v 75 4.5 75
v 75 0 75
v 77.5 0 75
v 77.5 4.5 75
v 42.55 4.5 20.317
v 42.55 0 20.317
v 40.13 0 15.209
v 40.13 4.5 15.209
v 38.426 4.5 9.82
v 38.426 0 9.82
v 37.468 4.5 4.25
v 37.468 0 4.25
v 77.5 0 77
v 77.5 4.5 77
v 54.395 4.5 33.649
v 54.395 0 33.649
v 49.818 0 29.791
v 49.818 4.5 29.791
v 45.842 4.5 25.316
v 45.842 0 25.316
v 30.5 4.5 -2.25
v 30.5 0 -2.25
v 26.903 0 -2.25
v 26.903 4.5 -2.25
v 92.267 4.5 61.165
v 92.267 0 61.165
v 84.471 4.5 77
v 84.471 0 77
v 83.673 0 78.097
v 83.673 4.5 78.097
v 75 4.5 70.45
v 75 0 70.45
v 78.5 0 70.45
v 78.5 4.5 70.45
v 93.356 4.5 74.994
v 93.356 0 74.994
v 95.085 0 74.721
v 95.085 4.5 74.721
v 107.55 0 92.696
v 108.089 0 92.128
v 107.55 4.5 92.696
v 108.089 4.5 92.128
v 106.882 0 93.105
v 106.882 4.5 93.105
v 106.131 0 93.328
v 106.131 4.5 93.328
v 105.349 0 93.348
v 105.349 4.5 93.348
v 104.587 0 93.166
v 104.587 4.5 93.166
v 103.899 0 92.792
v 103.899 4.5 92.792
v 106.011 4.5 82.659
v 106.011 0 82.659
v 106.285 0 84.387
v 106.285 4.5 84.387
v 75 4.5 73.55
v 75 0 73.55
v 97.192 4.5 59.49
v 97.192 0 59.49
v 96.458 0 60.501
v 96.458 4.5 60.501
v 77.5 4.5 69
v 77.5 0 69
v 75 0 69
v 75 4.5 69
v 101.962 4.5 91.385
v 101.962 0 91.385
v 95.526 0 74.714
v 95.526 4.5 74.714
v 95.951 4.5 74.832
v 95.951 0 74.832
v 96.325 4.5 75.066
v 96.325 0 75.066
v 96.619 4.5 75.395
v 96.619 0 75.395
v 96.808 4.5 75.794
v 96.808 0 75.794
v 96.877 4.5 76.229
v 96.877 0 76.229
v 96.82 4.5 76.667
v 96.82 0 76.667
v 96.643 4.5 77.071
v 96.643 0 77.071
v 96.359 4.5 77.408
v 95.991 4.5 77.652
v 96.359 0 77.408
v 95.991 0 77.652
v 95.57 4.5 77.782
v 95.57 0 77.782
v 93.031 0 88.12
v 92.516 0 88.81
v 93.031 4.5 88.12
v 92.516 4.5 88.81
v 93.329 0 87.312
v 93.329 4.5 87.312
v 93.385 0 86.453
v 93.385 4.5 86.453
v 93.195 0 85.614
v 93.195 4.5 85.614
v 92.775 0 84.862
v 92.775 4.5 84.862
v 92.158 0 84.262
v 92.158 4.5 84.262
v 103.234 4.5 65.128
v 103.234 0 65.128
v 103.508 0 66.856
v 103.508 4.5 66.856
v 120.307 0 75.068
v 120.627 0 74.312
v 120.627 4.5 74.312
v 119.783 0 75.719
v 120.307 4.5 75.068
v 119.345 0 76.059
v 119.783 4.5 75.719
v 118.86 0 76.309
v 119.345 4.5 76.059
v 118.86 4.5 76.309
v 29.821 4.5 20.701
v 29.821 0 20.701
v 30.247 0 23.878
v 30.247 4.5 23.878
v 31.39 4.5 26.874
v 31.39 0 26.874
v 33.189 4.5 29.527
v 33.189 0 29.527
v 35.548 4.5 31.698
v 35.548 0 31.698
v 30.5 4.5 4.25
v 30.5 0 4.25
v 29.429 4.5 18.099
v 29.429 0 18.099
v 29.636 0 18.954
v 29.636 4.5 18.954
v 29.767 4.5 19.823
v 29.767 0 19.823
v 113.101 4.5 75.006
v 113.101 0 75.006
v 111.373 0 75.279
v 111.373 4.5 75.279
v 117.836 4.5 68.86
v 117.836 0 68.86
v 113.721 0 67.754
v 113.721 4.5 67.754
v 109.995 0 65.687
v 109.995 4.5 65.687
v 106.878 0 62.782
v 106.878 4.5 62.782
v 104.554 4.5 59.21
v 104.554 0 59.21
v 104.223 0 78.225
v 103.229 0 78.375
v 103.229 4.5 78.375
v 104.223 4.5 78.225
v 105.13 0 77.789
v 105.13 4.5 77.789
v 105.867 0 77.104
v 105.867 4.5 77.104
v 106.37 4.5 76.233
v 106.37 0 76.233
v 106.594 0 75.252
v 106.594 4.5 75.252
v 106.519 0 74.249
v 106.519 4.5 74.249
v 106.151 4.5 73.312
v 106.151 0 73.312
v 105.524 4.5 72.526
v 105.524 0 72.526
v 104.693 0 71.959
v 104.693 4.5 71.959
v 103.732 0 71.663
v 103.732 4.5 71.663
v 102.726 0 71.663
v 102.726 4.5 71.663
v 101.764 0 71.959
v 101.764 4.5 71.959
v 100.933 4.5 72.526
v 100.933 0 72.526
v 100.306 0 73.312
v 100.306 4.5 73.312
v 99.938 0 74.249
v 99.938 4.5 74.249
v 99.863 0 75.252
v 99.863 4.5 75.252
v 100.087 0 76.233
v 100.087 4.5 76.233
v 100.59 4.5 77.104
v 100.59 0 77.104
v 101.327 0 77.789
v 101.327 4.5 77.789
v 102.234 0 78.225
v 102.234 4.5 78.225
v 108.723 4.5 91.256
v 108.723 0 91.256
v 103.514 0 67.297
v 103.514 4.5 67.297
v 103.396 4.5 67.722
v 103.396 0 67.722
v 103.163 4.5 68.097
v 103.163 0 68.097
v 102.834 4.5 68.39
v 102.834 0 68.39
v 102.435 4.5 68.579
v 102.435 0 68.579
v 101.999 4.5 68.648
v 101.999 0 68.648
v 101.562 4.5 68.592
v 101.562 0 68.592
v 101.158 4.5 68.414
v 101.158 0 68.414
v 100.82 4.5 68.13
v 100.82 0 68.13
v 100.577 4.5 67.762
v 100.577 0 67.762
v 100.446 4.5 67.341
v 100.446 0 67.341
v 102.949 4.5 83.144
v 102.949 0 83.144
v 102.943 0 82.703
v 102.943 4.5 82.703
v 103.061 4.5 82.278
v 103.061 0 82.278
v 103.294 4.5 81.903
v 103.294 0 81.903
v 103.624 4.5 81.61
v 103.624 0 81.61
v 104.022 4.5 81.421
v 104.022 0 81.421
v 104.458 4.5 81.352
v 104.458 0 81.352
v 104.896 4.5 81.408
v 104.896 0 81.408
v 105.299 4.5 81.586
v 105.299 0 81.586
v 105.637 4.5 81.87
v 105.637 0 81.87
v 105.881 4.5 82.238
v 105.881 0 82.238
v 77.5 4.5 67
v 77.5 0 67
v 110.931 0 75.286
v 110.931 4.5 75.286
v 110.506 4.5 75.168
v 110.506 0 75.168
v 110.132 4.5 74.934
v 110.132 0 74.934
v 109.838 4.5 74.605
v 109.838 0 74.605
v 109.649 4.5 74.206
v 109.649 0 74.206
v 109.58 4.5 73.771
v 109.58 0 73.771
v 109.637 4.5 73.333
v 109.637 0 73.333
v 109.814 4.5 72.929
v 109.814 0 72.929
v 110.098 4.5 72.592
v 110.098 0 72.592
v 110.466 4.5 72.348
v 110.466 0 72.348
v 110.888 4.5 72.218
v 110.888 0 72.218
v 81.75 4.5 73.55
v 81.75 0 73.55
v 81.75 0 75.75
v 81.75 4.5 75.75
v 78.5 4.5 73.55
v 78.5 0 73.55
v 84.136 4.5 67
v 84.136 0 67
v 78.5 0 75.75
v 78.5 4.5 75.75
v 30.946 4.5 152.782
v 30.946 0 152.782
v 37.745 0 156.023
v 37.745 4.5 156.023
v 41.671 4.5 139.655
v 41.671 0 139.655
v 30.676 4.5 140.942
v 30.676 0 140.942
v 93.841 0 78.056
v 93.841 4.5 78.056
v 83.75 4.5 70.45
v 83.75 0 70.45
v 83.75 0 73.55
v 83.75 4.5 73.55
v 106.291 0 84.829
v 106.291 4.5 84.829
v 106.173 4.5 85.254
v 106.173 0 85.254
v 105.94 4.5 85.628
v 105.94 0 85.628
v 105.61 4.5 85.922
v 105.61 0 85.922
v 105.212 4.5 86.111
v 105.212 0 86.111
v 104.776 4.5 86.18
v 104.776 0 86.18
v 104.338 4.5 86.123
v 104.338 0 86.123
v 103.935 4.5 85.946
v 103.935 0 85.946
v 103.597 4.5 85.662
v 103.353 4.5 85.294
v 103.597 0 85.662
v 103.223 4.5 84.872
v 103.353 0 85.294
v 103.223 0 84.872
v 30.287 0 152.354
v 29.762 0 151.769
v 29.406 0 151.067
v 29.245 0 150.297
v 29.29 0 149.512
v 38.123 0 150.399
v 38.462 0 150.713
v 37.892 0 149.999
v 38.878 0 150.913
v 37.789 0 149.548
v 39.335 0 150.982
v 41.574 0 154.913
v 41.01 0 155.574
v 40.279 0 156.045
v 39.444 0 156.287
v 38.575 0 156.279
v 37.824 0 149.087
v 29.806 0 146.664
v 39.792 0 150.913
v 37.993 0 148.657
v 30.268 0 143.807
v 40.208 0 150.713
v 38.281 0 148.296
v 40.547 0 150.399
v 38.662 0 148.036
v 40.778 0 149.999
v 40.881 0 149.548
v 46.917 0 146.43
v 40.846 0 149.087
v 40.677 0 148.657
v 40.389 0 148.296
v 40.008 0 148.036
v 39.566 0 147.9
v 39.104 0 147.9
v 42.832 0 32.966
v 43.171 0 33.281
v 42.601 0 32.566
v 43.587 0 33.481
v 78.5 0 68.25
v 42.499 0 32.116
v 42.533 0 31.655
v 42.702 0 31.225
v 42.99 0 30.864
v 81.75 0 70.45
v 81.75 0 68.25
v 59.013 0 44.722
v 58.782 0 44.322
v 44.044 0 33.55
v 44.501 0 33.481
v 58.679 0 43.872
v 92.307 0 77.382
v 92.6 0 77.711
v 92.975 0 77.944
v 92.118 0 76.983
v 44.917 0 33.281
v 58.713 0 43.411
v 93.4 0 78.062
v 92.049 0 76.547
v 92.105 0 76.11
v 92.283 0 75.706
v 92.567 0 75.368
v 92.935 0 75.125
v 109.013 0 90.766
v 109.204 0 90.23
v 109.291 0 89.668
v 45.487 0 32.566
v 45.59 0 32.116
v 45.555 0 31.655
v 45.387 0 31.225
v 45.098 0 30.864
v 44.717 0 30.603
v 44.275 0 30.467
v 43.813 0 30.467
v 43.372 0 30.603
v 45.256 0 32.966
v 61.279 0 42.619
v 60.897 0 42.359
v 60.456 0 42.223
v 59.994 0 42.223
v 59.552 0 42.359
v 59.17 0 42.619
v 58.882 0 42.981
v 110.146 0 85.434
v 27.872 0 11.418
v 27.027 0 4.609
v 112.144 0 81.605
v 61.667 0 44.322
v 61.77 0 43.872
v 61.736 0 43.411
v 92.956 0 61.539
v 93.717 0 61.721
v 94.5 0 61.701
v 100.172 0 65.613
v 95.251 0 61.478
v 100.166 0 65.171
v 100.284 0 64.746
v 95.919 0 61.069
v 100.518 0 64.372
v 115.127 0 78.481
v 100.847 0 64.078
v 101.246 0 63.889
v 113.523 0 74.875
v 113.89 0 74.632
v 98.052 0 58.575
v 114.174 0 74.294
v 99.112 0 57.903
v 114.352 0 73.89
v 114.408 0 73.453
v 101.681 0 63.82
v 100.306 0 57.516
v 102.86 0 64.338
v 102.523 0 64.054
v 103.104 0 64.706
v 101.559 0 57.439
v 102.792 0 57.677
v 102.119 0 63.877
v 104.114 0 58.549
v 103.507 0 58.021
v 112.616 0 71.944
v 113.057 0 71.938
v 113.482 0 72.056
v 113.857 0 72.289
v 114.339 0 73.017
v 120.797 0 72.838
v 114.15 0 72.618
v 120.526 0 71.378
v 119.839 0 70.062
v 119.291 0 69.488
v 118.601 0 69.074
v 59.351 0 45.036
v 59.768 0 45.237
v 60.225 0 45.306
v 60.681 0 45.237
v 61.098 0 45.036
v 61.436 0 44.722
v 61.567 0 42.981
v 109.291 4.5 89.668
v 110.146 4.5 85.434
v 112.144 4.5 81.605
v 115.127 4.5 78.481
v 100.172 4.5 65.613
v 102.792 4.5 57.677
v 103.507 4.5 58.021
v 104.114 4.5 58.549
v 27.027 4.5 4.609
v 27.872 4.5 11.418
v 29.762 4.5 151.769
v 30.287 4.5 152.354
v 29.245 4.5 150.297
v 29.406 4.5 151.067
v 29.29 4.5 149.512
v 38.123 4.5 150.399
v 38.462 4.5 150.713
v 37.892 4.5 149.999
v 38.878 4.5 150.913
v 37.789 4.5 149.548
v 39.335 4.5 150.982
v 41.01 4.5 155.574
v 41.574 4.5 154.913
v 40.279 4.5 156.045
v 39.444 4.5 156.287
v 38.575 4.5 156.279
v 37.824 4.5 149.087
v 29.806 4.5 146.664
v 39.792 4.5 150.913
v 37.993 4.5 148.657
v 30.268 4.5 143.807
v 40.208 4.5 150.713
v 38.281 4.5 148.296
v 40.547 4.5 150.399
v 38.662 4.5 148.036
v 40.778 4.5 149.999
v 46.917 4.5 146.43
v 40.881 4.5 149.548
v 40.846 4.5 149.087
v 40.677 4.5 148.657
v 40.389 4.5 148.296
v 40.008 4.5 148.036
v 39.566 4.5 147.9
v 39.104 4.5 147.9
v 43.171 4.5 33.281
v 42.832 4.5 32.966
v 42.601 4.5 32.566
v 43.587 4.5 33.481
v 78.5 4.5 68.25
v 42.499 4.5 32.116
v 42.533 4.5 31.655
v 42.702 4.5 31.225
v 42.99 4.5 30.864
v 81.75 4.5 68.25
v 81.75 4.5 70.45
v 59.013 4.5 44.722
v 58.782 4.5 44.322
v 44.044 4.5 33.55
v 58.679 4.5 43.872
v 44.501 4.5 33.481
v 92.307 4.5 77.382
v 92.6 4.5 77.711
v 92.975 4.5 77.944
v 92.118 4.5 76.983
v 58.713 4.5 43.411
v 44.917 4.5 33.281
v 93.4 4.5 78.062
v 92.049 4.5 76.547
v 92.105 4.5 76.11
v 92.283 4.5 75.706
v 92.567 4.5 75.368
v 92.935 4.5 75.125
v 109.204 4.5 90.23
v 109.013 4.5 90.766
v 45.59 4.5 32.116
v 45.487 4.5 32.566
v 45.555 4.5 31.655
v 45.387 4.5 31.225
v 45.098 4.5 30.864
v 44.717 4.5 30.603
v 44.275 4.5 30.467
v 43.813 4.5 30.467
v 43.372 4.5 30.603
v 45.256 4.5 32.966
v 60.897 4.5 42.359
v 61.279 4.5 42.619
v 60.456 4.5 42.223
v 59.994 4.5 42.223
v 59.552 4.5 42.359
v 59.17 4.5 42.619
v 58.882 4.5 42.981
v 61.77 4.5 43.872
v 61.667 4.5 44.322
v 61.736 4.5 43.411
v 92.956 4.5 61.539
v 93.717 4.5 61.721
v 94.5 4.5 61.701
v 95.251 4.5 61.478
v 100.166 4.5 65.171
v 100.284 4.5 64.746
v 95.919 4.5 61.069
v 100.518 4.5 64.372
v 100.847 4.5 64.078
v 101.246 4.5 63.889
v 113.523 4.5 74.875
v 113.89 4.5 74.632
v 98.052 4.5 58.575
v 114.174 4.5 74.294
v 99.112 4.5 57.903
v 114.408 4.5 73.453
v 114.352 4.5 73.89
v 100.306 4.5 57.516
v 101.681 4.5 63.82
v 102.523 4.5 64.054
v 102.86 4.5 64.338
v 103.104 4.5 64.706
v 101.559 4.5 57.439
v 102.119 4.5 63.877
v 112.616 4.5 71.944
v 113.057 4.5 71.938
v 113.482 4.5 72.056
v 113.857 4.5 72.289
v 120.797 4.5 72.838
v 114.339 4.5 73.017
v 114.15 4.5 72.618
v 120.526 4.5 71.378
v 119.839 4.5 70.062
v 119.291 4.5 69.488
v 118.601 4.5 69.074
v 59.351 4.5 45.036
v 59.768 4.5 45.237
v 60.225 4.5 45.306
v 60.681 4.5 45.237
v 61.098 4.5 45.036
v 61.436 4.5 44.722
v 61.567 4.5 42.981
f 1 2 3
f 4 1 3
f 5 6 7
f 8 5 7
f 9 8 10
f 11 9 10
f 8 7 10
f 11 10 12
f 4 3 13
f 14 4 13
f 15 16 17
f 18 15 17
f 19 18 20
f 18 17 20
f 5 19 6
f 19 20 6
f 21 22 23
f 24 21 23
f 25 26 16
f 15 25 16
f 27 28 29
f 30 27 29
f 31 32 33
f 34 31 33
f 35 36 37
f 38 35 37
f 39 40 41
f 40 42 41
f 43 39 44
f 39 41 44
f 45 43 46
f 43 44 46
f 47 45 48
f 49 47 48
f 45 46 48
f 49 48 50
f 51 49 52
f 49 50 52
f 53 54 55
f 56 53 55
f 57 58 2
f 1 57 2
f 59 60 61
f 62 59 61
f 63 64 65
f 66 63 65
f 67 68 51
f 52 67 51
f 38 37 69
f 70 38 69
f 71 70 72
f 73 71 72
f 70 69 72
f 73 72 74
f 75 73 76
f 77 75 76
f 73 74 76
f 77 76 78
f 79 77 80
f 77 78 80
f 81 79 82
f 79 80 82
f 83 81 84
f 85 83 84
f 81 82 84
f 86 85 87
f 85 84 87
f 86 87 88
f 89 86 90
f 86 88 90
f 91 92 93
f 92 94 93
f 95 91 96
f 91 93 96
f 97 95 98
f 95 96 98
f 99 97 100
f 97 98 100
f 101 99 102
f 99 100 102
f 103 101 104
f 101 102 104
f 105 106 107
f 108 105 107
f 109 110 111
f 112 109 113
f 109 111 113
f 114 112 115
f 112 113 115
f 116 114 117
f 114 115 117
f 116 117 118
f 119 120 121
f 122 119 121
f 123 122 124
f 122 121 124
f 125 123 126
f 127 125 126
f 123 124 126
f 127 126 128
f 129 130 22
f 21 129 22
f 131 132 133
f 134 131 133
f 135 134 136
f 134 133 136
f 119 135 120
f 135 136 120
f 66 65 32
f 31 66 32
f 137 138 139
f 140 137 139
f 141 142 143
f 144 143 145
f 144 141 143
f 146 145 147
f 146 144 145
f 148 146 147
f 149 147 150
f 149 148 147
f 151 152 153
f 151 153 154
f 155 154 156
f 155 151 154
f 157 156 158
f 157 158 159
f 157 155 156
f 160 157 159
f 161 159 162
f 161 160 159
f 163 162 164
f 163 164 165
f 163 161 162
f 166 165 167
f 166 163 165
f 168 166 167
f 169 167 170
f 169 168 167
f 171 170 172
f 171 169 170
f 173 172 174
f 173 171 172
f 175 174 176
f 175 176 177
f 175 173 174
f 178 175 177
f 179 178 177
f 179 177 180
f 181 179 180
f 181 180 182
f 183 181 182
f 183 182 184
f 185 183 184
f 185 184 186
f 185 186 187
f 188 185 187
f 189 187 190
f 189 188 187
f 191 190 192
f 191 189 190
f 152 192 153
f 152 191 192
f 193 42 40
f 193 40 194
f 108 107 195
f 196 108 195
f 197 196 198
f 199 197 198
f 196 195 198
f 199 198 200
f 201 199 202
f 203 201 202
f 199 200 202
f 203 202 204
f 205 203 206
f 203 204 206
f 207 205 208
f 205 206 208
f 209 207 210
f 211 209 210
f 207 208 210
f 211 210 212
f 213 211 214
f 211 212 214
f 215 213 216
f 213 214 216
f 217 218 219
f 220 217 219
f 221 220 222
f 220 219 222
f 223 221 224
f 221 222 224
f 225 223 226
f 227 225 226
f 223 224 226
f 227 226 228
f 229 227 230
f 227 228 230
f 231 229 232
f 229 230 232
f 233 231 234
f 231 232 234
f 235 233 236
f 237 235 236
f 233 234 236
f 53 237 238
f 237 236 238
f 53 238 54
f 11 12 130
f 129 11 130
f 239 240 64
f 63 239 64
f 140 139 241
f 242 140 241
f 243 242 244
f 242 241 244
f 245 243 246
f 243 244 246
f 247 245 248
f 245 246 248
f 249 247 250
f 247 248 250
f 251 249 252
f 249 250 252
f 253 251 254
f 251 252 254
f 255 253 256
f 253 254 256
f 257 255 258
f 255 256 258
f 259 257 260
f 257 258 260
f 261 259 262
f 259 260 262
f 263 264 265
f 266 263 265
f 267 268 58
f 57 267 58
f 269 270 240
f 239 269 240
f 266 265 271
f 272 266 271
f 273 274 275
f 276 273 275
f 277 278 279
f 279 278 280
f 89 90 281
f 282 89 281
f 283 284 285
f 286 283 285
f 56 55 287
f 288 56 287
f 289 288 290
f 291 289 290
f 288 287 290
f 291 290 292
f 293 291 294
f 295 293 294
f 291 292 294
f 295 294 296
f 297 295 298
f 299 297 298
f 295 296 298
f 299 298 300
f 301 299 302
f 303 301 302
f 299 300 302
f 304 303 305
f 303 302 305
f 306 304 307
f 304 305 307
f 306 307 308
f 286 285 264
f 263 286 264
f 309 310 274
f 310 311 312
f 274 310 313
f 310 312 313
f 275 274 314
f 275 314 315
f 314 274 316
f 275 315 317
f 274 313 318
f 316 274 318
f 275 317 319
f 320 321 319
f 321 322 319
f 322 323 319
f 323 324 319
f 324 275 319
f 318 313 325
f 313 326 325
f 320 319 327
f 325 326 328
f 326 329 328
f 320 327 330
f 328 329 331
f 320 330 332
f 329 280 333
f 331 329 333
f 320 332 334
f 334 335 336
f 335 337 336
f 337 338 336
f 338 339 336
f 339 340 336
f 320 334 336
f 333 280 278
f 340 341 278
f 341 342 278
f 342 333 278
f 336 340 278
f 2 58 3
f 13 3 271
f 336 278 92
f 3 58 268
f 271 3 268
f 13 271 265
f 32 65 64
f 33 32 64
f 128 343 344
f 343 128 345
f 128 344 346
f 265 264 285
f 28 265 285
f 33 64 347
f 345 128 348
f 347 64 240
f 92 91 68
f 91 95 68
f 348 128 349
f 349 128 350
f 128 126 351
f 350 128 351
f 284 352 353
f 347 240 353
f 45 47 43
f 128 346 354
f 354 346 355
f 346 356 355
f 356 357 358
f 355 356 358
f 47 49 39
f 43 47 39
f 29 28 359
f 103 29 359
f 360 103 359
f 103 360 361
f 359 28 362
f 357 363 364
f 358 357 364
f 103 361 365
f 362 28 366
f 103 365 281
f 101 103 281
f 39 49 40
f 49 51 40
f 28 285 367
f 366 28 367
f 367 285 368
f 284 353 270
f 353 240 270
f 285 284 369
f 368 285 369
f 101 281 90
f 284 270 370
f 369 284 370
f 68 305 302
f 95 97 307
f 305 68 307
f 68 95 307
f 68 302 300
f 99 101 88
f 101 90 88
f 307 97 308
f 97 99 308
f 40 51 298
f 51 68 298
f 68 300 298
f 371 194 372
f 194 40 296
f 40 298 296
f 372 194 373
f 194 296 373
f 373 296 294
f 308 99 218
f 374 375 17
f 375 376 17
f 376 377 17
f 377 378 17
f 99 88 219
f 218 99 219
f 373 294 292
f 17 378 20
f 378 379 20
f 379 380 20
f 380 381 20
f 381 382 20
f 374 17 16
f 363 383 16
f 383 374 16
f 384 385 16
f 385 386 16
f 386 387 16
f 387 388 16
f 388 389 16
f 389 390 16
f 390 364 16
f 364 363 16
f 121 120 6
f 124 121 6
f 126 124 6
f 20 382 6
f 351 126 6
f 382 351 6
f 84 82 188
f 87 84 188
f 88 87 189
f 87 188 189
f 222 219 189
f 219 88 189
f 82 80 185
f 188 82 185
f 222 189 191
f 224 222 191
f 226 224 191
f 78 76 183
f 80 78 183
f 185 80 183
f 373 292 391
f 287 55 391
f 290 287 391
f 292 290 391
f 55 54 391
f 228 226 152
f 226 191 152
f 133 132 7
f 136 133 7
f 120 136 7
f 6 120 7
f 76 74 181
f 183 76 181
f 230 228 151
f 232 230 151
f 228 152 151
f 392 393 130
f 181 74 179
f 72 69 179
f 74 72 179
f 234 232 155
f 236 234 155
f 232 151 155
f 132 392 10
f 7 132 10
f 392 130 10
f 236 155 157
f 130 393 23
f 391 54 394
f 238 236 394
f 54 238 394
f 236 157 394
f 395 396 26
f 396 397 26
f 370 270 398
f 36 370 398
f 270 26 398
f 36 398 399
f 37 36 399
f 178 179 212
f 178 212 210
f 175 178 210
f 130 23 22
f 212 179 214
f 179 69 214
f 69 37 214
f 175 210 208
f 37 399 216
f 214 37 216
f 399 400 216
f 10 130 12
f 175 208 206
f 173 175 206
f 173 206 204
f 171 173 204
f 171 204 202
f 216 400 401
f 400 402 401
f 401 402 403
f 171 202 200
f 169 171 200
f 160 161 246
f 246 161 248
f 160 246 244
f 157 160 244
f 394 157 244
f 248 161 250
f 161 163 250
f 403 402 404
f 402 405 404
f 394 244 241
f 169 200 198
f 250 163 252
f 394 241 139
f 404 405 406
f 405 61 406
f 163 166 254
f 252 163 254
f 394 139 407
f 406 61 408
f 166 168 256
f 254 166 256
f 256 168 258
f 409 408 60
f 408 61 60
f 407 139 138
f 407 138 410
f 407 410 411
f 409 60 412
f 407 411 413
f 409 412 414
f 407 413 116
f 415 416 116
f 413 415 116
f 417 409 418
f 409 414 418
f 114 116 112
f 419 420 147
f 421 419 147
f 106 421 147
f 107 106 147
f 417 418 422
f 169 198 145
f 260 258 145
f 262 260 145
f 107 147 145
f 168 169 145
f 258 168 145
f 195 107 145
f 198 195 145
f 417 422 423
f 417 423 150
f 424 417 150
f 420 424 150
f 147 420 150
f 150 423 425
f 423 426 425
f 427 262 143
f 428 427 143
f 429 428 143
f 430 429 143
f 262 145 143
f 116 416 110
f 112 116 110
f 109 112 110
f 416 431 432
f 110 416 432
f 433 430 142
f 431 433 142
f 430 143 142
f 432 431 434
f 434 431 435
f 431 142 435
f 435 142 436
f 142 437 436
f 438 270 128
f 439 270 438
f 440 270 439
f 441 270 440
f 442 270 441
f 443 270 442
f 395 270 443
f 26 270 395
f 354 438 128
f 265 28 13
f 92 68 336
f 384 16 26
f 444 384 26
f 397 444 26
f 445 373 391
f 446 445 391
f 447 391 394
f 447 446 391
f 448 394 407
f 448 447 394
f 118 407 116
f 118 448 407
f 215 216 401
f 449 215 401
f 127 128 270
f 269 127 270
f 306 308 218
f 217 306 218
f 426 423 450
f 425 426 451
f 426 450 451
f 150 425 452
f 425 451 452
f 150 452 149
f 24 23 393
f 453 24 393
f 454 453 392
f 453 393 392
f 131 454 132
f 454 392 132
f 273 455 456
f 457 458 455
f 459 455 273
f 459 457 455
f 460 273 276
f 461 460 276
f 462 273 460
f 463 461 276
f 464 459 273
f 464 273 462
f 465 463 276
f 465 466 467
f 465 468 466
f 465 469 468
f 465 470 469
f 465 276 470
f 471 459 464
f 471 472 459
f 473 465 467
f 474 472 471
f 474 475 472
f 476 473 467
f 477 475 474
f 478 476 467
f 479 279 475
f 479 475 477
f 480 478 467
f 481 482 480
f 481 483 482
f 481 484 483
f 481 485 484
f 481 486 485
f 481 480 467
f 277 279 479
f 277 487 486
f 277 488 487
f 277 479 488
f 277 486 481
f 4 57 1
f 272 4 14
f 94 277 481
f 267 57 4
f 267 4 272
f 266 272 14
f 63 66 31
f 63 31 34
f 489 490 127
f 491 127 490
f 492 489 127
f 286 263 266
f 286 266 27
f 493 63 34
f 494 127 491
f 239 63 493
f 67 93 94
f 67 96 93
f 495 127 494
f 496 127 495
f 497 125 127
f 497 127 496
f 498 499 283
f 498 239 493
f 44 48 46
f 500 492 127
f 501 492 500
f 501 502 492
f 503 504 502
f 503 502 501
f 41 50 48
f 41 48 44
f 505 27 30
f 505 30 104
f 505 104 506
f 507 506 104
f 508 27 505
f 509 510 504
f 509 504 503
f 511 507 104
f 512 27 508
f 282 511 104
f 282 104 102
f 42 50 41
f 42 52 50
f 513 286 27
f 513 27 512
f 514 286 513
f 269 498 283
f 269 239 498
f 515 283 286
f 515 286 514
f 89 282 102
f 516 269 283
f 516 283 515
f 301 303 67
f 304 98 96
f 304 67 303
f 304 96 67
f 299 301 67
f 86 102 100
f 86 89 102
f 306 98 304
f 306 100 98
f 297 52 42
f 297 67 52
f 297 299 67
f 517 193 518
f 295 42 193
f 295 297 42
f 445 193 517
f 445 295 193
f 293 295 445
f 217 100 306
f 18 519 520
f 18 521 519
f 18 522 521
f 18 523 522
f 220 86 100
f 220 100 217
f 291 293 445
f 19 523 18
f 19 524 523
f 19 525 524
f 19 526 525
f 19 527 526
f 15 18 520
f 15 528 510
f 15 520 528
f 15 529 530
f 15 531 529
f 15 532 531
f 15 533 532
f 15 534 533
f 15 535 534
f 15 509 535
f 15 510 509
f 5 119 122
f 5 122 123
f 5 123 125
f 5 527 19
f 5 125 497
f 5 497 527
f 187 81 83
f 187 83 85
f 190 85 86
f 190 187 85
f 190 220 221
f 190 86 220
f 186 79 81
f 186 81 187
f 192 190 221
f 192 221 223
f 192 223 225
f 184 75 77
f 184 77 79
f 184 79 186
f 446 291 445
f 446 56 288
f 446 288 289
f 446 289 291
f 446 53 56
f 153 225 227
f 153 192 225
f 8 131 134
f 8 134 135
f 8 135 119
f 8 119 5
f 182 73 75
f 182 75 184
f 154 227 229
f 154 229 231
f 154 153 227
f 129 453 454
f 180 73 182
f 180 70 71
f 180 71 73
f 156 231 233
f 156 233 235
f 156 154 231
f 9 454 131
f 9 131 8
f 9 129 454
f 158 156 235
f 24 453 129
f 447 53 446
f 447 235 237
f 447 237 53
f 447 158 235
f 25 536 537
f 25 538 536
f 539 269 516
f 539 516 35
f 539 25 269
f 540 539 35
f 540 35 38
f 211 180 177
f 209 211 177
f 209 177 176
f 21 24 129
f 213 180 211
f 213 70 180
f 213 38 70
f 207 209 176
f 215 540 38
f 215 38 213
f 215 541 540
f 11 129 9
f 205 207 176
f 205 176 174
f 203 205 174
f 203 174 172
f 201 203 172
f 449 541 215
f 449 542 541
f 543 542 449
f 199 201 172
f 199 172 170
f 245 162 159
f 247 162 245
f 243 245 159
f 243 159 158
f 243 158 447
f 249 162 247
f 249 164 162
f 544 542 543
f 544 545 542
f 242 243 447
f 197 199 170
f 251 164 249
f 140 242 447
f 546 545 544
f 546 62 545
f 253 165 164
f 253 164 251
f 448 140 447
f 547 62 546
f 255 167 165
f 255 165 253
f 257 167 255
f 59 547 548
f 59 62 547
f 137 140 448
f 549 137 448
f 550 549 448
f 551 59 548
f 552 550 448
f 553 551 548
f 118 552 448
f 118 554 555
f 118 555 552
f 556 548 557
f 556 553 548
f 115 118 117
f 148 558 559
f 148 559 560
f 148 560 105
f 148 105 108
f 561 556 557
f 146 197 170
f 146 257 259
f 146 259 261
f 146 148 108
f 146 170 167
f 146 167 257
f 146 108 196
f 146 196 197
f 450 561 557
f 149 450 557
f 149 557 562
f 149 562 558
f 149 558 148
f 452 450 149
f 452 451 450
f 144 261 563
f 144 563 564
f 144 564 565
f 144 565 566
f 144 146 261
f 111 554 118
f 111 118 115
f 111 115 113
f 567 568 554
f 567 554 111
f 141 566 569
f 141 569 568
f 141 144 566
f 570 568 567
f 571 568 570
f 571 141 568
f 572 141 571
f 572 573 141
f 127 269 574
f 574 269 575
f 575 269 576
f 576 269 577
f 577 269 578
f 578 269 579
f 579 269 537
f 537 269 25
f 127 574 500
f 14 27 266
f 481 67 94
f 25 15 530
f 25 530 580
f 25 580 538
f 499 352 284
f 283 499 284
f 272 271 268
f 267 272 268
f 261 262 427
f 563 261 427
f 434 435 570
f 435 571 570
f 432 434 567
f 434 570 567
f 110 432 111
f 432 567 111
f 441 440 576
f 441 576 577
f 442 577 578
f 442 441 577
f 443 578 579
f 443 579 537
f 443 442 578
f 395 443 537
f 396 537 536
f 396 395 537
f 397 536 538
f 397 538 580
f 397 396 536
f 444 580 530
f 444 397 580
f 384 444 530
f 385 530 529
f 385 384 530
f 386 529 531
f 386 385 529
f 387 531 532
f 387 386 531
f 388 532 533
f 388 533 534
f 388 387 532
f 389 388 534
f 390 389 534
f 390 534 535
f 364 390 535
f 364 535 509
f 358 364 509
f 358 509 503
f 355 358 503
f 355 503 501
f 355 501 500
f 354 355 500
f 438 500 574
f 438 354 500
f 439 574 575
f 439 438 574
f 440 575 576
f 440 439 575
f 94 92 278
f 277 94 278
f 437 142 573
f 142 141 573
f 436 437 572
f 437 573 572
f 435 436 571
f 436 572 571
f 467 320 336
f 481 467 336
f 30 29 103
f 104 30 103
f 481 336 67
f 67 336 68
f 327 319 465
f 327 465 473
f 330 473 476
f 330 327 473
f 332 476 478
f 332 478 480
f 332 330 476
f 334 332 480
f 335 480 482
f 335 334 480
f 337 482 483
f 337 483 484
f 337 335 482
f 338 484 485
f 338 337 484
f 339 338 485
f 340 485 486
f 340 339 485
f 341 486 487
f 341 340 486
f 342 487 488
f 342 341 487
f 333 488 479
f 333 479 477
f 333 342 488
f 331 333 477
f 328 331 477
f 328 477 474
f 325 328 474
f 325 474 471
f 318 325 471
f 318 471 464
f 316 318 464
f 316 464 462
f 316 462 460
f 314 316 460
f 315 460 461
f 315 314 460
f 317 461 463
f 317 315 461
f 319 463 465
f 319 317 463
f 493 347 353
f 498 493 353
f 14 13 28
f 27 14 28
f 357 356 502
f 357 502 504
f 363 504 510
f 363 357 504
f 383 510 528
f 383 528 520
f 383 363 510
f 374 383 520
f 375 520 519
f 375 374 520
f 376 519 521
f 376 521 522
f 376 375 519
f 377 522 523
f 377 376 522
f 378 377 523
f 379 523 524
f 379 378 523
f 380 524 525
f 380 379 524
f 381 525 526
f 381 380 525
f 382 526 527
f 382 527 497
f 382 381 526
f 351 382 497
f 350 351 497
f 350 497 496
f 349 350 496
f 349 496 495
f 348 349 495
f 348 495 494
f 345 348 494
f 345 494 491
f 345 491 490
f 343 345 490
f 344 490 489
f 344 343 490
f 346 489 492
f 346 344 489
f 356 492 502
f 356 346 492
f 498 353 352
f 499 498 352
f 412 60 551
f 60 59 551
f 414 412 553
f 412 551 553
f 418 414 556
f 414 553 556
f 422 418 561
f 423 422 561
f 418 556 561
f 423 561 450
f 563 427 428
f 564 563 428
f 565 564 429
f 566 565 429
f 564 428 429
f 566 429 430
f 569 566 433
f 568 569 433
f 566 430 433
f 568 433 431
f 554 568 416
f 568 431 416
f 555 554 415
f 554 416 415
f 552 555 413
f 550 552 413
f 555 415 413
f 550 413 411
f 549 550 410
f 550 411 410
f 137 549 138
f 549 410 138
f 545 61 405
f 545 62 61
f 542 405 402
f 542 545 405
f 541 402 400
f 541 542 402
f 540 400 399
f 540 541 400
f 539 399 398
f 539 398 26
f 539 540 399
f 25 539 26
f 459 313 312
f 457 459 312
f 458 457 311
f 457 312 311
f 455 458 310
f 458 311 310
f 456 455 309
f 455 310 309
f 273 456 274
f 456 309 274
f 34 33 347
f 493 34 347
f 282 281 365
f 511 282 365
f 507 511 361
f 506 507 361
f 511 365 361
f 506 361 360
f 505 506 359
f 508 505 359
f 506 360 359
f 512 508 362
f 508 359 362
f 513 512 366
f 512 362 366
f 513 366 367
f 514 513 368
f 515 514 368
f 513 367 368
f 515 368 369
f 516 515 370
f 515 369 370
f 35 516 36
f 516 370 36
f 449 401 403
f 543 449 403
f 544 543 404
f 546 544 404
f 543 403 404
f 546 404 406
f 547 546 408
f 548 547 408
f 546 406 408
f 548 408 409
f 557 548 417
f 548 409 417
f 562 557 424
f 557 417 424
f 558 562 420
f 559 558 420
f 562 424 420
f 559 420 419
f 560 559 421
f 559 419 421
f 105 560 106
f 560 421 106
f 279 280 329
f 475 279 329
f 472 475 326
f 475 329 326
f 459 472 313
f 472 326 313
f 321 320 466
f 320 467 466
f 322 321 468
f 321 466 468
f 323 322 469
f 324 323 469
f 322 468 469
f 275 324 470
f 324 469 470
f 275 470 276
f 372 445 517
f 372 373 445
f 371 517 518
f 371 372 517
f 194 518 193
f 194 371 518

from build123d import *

# Parameters (mm, degrees)
SKETCH_3_R          = 1.55
SKETCH_3_R_2        = 3.375
EXTRUDE_1_DEPTH     = 4.5
FILLET_1_R          = 5
CUT_EXTRUDE_2_REACH = 200.281
FILLET_3_R          = 3
EXTRUDE_5096_DEPTH  = 4.5


with BuildPart() as part:
    # 草图3 → 凸台-拉伸1 (new body)
    with BuildSketch(Plane(origin=(0, 0, 0), x_dir=(1, 0, 0), z_dir=(0, 1, 0))):
        with BuildLine():
            Line((94.694386062, -62.928175745), (41.131907973, -24.012757507))
            ThreePointArc((41.131907973, -24.012757507), (34.497097301, -25.063608282), (35.547948076, -31.698418954))
            Line((35.547948076, -31.698418954), (84.136405992, -67))
            Line((84.136405992, -67), (77.5, -67))
            Line((77.5, -67), (77.5, -69))
            Line((77.5, -69), (75, -69))
            Line((75, -69), (75, -70.45))
            Line((75, -70.45), (78.5, -70.45))
            Line((78.5, -70.45), (78.5, -68.25))
            Line((78.5, -68.25), (81.75, -68.25))
            Line((81.75, -68.25), (81.75, -70.45))
            Line((81.75, -70.45), (83.75, -70.45))
            Line((83.75, -70.45), (83.75, -73.55))
            Line((83.75, -73.55), (81.75, -73.55))
            Line((81.75, -73.55), (81.75, -75.75))
            Line((81.75, -75.75), (78.5, -75.75))
            Line((78.5, -75.75), (78.5, -73.55))
            Line((78.5, -73.55), (75, -73.55))
            Line((75, -73.55), (75, -75))
            Line((75, -75), (77.5, -75))
            Line((77.5, -75), (77.5, -77))
            Line((77.5, -77), (84.136405992, -77))
            Line((84.136405992, -77), (84.470607294, -77))
            Line((84.470607294, -77), (83.673412582, -78.097244389))
            Line((83.673412582, -78.097244389), (94.999650503, -86.326237921))
            Line((94.999650503, -86.326237921), (41.671203749, -139.654684675))
            Line((41.671203749, -139.654684675), (30.676078989, -140.941956792))
            ThreePointArc((30.676078989, -140.941956792), (30.043220441, -145.236869059), (29.290205532, -149.512351472))
            ThreePointArc((29.290205532, -149.512351472), (29.56084749, -151.429597804), (30.946340523, -152.782184076))
            Line((30.946340523, -152.782184076), (40.152805518, -157.170406668))
            Line((40.152805518, -157.170406668), (46.916516286, -146.430187419))
            Line((46.916516286, -146.430187419), (101.962013194, -91.384690511))
            Line((101.962013194, -91.384690511), (106.325888424, -94.555231453))
            Line((106.325888424, -94.555231453), (122.783875489, -71.902755611))
            Line((122.783875489, -71.902755611), (100.131399646, -55.444768547))
            Line((100.131399646, -55.444768547), (94.694386062, -62.928175745))
        make_face()
        with Locations(Location((39.335, -149.432300402, 0), (0, 0, 270))):
            Circle(SKETCH_3_R, mode=Mode.SUBTRACT)
        with Locations(Location((44.044221455, -32, 0), (0, 0, 270))):
            Circle(SKETCH_3_R, mode=Mode.SUBTRACT)
        with Locations(Location((60.224561343, -43.755705046, 0), (0, 0, 270))):
            Circle(SKETCH_3_R, mode=Mode.SUBTRACT)
        with BuildLine():
            ThreePointArc((95.08466389, -74.720558792), (96.858054238, -76.0090023), (95.569610731, -77.782392648))
            Line((95.569610731, -77.782392648), (93.841156135, -78.056152962))
            ThreePointArc((93.841156135, -78.056152962), (92.067765787, -76.767709455), (93.356209294, -74.994319106))
            Line((93.356209294, -74.994319106), (95.08466389, -74.720558792))
        make_face(mode=Mode.SUBTRACT)
        with BuildLine():
            Line((103.222963142, -84.872434742), (102.949202828, -83.143980146))
            ThreePointArc((102.949202828, -83.143980146), (104.237646335, -81.370589797), (106.011036684, -82.659033304))
            Line((106.011036684, -82.659033304), (106.284796997, -84.3874879))
            ThreePointArc((106.284796997, -84.3874879), (104.99635349, -86.160878249), (103.222963142, -84.872434742))
        make_face(mode=Mode.SUBTRACT)
        with Locations(Location((103.228644035, -75, 0), (0, 0, 270))):
            Circle(SKETCH_3_R_2, mode=Mode.SUBTRACT)
        with BuildLine():
            ThreePointArc((111.372624181, -75.279441208), (109.599233832, -73.9909977), (110.887677339, -72.217607352))
            Line((110.887677339, -72.217607352), (112.616131935, -71.943847038))
            ThreePointArc((112.616131935, -71.943847038), (114.389522284, -73.232290545), (113.101078777, -75.005680894))
            Line((113.101078777, -75.005680894), (111.372624181, -75.279441208))
        make_face(mode=Mode.SUBTRACT)
        with BuildLine():
            Line((103.234324929, -65.127565258), (103.508085243, -66.856019854))
            ThreePointArc((103.508085243, -66.856019854), (102.219641736, -68.629410203), (100.446251387, -67.340966696))
            Line((100.446251387, -67.340966696), (100.172491073, -65.6125121))
            ThreePointArc((100.172491073, -65.6125121), (101.46093458, -63.839121751), (103.234324929, -65.127565258))
        make_face(mode=Mode.SUBTRACT)
    extrude(amount=EXTRUDE_1_DEPTH)

    # 圆角-美观1
    fillet_1_edges = [part.edges().sort_by_distance(p)[0] for p in [
        (100.131399646, 2.25, 55.444768547),
        (122.783875489, 2.25, 71.902755611),
    ]]
    fillet(fillet_1_edges, radius=FILLET_1_R)

    # 草图4 → 圆弧-美观2 (cut, up to next)
    with BuildSketch(Plane(origin=(0, 4.5, 0), x_dir=(1, 0, 0), z_dir=(0, 1, 0)), mode=Mode.PRIVATE) as cut_extrude_2_sk1:
        with BuildLine():
            ThreePointArc((118.738790517, -68.963829349), (109.994899962, -65.687047674), (104.176484618, -58.383694808))
            Line((104.176484618, -58.383694808), (118.738790517, -68.963829349))
        make_face()
    cut_extrude_2_tool1 = extrude(cut_extrude_2_sk1.sketch, amount=-CUT_EXTRUDE_2_REACH, mode=Mode.PRIVATE) & part.part
    # 草图4 → 圆弧-美观2 (cut, up to next)
    with BuildSketch(Plane(origin=(0, 4.5, 0), x_dir=(1, 0, 0), z_dir=(0, 1, 0)), mode=Mode.PRIVATE) as cut_extrude_2_sk2:
        with BuildLine():
            Line((119.844949227, -75.947840583), (109.264814686, -90.510146481))
            ThreePointArc((109.264814686, -90.510146481), (112.204348353, -81.521230905), (119.844949227, -75.947840583))
        make_face()
    cut_extrude_2_tool2 = extrude(cut_extrude_2_sk2.sketch, amount=-CUT_EXTRUDE_2_REACH, mode=Mode.PRIVATE) & part.part
    add(cut_extrude_2_tool1.solids().sort_by_distance((110.868828, 4.5, 64.48419))[0], mode=Mode.SUBTRACT)
    add(cut_extrude_2_tool2.solids().sort_by_distance((113.606622, 4.5, 82.540042))[0], mode=Mode.SUBTRACT)

    # 圆角-美观3
    fillet_3_edges = [part.edges().sort_by_distance(p)[0] for p in [
        (94.999650503, 2.25, 86.326237921),
        (94.694386062, 2.25, 62.928175745),
        (106.325888424, 2.25, 94.555231453),
        (40.152805518, 2.25, 157.170406668),
        (118.738790517, 2.25, 68.963829349),
        (104.176484618, 2.25, 58.383694808),
        (119.844949227, 2.25, 75.947840583),
        (109.264814686, 2.25, 90.510146481),
    ]]
    fillet(fillet_3_edges, radius=FILLET_3_R)

    # 草图5 → Extrude 5096 (add)
    with BuildSketch(Plane(origin=(0, 0, 0), x_dir=(1, 0, 0), z_dir=(0, 1, 0))):
        with BuildLine():
            Line((41.131907973, -24.012757507), (54.395000648, -33.648958388))
            ThreePointArc((54.395000648, -33.648958388), (47.749518962, -27.625359459), (42.549937685, -20.317108954))
            ThreePointArc((42.549937685, -20.317108954), (39.186571182, -12.543642943), (37.467706796, -4.25))
            Line((37.467706796, -4.25), (30.5, -4.25))
            Line((30.5, -4.25), (30.5, -3.25))
            Line((30.5, -3.25), (30.5, 2.25))
            Line((30.5, 2.25), (26.902552576, 2.25))
            ThreePointArc((26.902552576, 2.25), (27.35989158, -8.024554542), (29.428853503, -18.099028552))
            ThreePointArc((29.428853503, -18.099028552), (29.710927986, -19.386919832), (29.821122157, -20.700726214))
            ThreePointArc((29.821122157, -20.700726214), (31.390100135, -26.873623403), (35.547948076, -31.698418954))
            Line((35.547948076, -31.698418954), (41.131907973, -24.012757507))
        make_face()
    extrude(amount=EXTRUDE_5096_DEPTH)


solid = part.part
